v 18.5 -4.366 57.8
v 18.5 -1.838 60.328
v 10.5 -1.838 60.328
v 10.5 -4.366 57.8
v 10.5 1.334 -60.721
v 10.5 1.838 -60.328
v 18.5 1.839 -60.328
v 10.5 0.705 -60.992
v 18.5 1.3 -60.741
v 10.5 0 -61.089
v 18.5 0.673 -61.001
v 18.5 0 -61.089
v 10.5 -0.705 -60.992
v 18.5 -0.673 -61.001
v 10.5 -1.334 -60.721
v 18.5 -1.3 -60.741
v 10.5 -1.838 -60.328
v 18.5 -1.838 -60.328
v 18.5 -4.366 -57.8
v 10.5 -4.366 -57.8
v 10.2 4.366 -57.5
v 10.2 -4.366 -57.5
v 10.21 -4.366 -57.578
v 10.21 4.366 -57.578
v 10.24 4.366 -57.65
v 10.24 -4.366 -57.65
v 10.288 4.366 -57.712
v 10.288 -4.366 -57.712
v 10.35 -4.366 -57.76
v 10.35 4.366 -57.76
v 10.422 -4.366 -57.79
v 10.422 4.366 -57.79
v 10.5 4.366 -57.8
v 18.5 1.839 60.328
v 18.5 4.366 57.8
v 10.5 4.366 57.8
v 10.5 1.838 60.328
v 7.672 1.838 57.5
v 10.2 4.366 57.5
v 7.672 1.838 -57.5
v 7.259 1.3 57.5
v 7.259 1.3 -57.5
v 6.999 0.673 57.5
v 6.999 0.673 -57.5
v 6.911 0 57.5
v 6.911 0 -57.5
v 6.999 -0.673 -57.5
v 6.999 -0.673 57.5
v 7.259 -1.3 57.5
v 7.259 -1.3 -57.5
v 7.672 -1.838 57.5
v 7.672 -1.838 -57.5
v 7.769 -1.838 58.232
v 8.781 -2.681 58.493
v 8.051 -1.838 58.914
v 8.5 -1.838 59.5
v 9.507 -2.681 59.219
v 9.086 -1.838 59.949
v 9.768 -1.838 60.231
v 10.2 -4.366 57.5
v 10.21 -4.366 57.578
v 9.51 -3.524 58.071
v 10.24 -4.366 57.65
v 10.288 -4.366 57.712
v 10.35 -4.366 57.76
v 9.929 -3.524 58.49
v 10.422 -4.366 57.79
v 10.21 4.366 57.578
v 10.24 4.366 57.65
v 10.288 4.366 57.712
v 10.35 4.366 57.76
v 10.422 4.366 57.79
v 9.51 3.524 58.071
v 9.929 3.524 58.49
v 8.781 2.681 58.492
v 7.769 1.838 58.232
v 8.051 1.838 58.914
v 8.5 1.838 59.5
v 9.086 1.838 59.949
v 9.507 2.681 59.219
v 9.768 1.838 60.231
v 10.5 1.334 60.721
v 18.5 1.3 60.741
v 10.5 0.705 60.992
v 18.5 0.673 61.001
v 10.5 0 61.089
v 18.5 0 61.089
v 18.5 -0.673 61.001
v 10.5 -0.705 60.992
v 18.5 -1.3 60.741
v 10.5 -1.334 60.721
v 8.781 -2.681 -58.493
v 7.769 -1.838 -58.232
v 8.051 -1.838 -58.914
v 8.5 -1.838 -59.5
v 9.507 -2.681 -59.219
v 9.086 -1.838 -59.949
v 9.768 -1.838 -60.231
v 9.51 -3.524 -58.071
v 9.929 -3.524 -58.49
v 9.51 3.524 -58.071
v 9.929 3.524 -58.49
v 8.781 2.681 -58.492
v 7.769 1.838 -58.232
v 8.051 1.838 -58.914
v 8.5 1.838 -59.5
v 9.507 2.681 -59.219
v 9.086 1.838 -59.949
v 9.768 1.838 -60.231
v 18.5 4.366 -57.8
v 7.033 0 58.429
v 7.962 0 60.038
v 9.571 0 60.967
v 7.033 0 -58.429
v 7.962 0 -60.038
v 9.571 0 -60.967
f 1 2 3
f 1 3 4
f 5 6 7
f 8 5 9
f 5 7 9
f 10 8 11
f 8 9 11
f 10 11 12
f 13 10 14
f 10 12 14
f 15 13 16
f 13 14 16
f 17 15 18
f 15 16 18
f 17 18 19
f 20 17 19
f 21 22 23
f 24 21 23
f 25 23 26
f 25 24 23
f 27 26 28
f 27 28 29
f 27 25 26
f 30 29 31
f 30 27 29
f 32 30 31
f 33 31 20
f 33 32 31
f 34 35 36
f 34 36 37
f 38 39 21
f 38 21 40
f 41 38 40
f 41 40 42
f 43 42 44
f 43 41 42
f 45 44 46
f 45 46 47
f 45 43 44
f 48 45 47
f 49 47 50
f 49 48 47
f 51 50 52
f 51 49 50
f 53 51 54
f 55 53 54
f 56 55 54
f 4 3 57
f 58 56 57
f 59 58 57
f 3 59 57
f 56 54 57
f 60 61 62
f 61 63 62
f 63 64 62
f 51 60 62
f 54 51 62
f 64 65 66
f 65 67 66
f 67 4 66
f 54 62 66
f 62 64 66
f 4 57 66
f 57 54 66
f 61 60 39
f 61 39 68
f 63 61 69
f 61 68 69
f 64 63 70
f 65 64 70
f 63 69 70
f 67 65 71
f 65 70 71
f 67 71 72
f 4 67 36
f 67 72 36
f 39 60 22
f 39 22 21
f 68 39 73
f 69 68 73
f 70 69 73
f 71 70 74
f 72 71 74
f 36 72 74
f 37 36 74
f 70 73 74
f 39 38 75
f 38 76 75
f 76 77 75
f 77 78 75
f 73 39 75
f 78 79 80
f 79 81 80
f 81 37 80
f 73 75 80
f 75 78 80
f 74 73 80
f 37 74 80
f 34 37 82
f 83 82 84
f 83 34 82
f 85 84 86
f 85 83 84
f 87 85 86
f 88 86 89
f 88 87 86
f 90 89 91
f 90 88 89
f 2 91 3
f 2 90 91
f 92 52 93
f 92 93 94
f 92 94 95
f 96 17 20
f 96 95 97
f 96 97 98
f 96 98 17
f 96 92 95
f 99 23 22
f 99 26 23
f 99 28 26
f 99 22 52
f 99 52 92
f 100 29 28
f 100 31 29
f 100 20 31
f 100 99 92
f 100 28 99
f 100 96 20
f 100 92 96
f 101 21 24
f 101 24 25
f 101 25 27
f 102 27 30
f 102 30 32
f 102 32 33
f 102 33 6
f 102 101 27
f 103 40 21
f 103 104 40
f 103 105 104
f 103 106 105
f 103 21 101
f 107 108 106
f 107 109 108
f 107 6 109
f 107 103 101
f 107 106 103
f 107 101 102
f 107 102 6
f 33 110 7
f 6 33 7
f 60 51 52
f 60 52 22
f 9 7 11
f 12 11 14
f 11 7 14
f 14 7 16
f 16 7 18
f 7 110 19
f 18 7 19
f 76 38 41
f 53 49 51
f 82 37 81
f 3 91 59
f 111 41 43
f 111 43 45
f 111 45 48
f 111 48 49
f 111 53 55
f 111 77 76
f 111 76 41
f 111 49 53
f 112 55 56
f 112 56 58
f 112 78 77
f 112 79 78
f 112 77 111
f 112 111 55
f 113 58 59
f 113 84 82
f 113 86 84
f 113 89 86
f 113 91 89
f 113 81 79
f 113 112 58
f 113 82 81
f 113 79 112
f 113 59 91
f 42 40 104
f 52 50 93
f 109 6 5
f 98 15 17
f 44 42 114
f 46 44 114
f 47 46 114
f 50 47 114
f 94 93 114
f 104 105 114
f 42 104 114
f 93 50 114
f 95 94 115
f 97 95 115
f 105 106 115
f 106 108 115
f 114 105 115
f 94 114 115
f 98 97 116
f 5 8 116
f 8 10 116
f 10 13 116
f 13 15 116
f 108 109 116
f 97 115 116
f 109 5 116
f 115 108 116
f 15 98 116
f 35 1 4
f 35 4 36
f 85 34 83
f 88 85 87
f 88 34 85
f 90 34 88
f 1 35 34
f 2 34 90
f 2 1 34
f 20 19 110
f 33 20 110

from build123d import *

# Parameters (mm, degrees)
FILLET003_R = 2.6


with BuildPart() as railfillet:
    # Sweep: sweep along a path in Sketch005
    with BuildLine(Plane.XZ) as sweep_path:
        Line((6.5, 0), (6.5, 57.5))
        ThreePointArc((6.5, 57.5), (7.671565, 60.328443), (10.500001, 61.500024))
        Line((10.500001, 61.500024), (18.500001, 61.500024))
    # Sketch011 → Sweep (sweep)
    with BuildSketch(Plane.XY):
        Polygon((10.2, 4.366273), (5.833727, 0), (10.2, -4.366273), align=None)
    sweep(path=sweep_path.line)

    # Fillet003
    fillet003_edges = [railfillet.edges().sort_by_distance(p)[0] for p in [
        (14.500005, 1.3e-05, 62.166285),
    ]]
    fillet(fillet003_edges, radius=FILLET003_R)


with BuildPart() as guide:
    # Part__Mirroring: instance of RailFillet
    add(railfillet.part.mirror(Plane(origin=(0, 0, 0), x_dir=(0, 1, 0), z_dir=(0, 0, 1))))

    # Fusion: union RailFillet
    add(railfillet.part)


solid = guide.part
